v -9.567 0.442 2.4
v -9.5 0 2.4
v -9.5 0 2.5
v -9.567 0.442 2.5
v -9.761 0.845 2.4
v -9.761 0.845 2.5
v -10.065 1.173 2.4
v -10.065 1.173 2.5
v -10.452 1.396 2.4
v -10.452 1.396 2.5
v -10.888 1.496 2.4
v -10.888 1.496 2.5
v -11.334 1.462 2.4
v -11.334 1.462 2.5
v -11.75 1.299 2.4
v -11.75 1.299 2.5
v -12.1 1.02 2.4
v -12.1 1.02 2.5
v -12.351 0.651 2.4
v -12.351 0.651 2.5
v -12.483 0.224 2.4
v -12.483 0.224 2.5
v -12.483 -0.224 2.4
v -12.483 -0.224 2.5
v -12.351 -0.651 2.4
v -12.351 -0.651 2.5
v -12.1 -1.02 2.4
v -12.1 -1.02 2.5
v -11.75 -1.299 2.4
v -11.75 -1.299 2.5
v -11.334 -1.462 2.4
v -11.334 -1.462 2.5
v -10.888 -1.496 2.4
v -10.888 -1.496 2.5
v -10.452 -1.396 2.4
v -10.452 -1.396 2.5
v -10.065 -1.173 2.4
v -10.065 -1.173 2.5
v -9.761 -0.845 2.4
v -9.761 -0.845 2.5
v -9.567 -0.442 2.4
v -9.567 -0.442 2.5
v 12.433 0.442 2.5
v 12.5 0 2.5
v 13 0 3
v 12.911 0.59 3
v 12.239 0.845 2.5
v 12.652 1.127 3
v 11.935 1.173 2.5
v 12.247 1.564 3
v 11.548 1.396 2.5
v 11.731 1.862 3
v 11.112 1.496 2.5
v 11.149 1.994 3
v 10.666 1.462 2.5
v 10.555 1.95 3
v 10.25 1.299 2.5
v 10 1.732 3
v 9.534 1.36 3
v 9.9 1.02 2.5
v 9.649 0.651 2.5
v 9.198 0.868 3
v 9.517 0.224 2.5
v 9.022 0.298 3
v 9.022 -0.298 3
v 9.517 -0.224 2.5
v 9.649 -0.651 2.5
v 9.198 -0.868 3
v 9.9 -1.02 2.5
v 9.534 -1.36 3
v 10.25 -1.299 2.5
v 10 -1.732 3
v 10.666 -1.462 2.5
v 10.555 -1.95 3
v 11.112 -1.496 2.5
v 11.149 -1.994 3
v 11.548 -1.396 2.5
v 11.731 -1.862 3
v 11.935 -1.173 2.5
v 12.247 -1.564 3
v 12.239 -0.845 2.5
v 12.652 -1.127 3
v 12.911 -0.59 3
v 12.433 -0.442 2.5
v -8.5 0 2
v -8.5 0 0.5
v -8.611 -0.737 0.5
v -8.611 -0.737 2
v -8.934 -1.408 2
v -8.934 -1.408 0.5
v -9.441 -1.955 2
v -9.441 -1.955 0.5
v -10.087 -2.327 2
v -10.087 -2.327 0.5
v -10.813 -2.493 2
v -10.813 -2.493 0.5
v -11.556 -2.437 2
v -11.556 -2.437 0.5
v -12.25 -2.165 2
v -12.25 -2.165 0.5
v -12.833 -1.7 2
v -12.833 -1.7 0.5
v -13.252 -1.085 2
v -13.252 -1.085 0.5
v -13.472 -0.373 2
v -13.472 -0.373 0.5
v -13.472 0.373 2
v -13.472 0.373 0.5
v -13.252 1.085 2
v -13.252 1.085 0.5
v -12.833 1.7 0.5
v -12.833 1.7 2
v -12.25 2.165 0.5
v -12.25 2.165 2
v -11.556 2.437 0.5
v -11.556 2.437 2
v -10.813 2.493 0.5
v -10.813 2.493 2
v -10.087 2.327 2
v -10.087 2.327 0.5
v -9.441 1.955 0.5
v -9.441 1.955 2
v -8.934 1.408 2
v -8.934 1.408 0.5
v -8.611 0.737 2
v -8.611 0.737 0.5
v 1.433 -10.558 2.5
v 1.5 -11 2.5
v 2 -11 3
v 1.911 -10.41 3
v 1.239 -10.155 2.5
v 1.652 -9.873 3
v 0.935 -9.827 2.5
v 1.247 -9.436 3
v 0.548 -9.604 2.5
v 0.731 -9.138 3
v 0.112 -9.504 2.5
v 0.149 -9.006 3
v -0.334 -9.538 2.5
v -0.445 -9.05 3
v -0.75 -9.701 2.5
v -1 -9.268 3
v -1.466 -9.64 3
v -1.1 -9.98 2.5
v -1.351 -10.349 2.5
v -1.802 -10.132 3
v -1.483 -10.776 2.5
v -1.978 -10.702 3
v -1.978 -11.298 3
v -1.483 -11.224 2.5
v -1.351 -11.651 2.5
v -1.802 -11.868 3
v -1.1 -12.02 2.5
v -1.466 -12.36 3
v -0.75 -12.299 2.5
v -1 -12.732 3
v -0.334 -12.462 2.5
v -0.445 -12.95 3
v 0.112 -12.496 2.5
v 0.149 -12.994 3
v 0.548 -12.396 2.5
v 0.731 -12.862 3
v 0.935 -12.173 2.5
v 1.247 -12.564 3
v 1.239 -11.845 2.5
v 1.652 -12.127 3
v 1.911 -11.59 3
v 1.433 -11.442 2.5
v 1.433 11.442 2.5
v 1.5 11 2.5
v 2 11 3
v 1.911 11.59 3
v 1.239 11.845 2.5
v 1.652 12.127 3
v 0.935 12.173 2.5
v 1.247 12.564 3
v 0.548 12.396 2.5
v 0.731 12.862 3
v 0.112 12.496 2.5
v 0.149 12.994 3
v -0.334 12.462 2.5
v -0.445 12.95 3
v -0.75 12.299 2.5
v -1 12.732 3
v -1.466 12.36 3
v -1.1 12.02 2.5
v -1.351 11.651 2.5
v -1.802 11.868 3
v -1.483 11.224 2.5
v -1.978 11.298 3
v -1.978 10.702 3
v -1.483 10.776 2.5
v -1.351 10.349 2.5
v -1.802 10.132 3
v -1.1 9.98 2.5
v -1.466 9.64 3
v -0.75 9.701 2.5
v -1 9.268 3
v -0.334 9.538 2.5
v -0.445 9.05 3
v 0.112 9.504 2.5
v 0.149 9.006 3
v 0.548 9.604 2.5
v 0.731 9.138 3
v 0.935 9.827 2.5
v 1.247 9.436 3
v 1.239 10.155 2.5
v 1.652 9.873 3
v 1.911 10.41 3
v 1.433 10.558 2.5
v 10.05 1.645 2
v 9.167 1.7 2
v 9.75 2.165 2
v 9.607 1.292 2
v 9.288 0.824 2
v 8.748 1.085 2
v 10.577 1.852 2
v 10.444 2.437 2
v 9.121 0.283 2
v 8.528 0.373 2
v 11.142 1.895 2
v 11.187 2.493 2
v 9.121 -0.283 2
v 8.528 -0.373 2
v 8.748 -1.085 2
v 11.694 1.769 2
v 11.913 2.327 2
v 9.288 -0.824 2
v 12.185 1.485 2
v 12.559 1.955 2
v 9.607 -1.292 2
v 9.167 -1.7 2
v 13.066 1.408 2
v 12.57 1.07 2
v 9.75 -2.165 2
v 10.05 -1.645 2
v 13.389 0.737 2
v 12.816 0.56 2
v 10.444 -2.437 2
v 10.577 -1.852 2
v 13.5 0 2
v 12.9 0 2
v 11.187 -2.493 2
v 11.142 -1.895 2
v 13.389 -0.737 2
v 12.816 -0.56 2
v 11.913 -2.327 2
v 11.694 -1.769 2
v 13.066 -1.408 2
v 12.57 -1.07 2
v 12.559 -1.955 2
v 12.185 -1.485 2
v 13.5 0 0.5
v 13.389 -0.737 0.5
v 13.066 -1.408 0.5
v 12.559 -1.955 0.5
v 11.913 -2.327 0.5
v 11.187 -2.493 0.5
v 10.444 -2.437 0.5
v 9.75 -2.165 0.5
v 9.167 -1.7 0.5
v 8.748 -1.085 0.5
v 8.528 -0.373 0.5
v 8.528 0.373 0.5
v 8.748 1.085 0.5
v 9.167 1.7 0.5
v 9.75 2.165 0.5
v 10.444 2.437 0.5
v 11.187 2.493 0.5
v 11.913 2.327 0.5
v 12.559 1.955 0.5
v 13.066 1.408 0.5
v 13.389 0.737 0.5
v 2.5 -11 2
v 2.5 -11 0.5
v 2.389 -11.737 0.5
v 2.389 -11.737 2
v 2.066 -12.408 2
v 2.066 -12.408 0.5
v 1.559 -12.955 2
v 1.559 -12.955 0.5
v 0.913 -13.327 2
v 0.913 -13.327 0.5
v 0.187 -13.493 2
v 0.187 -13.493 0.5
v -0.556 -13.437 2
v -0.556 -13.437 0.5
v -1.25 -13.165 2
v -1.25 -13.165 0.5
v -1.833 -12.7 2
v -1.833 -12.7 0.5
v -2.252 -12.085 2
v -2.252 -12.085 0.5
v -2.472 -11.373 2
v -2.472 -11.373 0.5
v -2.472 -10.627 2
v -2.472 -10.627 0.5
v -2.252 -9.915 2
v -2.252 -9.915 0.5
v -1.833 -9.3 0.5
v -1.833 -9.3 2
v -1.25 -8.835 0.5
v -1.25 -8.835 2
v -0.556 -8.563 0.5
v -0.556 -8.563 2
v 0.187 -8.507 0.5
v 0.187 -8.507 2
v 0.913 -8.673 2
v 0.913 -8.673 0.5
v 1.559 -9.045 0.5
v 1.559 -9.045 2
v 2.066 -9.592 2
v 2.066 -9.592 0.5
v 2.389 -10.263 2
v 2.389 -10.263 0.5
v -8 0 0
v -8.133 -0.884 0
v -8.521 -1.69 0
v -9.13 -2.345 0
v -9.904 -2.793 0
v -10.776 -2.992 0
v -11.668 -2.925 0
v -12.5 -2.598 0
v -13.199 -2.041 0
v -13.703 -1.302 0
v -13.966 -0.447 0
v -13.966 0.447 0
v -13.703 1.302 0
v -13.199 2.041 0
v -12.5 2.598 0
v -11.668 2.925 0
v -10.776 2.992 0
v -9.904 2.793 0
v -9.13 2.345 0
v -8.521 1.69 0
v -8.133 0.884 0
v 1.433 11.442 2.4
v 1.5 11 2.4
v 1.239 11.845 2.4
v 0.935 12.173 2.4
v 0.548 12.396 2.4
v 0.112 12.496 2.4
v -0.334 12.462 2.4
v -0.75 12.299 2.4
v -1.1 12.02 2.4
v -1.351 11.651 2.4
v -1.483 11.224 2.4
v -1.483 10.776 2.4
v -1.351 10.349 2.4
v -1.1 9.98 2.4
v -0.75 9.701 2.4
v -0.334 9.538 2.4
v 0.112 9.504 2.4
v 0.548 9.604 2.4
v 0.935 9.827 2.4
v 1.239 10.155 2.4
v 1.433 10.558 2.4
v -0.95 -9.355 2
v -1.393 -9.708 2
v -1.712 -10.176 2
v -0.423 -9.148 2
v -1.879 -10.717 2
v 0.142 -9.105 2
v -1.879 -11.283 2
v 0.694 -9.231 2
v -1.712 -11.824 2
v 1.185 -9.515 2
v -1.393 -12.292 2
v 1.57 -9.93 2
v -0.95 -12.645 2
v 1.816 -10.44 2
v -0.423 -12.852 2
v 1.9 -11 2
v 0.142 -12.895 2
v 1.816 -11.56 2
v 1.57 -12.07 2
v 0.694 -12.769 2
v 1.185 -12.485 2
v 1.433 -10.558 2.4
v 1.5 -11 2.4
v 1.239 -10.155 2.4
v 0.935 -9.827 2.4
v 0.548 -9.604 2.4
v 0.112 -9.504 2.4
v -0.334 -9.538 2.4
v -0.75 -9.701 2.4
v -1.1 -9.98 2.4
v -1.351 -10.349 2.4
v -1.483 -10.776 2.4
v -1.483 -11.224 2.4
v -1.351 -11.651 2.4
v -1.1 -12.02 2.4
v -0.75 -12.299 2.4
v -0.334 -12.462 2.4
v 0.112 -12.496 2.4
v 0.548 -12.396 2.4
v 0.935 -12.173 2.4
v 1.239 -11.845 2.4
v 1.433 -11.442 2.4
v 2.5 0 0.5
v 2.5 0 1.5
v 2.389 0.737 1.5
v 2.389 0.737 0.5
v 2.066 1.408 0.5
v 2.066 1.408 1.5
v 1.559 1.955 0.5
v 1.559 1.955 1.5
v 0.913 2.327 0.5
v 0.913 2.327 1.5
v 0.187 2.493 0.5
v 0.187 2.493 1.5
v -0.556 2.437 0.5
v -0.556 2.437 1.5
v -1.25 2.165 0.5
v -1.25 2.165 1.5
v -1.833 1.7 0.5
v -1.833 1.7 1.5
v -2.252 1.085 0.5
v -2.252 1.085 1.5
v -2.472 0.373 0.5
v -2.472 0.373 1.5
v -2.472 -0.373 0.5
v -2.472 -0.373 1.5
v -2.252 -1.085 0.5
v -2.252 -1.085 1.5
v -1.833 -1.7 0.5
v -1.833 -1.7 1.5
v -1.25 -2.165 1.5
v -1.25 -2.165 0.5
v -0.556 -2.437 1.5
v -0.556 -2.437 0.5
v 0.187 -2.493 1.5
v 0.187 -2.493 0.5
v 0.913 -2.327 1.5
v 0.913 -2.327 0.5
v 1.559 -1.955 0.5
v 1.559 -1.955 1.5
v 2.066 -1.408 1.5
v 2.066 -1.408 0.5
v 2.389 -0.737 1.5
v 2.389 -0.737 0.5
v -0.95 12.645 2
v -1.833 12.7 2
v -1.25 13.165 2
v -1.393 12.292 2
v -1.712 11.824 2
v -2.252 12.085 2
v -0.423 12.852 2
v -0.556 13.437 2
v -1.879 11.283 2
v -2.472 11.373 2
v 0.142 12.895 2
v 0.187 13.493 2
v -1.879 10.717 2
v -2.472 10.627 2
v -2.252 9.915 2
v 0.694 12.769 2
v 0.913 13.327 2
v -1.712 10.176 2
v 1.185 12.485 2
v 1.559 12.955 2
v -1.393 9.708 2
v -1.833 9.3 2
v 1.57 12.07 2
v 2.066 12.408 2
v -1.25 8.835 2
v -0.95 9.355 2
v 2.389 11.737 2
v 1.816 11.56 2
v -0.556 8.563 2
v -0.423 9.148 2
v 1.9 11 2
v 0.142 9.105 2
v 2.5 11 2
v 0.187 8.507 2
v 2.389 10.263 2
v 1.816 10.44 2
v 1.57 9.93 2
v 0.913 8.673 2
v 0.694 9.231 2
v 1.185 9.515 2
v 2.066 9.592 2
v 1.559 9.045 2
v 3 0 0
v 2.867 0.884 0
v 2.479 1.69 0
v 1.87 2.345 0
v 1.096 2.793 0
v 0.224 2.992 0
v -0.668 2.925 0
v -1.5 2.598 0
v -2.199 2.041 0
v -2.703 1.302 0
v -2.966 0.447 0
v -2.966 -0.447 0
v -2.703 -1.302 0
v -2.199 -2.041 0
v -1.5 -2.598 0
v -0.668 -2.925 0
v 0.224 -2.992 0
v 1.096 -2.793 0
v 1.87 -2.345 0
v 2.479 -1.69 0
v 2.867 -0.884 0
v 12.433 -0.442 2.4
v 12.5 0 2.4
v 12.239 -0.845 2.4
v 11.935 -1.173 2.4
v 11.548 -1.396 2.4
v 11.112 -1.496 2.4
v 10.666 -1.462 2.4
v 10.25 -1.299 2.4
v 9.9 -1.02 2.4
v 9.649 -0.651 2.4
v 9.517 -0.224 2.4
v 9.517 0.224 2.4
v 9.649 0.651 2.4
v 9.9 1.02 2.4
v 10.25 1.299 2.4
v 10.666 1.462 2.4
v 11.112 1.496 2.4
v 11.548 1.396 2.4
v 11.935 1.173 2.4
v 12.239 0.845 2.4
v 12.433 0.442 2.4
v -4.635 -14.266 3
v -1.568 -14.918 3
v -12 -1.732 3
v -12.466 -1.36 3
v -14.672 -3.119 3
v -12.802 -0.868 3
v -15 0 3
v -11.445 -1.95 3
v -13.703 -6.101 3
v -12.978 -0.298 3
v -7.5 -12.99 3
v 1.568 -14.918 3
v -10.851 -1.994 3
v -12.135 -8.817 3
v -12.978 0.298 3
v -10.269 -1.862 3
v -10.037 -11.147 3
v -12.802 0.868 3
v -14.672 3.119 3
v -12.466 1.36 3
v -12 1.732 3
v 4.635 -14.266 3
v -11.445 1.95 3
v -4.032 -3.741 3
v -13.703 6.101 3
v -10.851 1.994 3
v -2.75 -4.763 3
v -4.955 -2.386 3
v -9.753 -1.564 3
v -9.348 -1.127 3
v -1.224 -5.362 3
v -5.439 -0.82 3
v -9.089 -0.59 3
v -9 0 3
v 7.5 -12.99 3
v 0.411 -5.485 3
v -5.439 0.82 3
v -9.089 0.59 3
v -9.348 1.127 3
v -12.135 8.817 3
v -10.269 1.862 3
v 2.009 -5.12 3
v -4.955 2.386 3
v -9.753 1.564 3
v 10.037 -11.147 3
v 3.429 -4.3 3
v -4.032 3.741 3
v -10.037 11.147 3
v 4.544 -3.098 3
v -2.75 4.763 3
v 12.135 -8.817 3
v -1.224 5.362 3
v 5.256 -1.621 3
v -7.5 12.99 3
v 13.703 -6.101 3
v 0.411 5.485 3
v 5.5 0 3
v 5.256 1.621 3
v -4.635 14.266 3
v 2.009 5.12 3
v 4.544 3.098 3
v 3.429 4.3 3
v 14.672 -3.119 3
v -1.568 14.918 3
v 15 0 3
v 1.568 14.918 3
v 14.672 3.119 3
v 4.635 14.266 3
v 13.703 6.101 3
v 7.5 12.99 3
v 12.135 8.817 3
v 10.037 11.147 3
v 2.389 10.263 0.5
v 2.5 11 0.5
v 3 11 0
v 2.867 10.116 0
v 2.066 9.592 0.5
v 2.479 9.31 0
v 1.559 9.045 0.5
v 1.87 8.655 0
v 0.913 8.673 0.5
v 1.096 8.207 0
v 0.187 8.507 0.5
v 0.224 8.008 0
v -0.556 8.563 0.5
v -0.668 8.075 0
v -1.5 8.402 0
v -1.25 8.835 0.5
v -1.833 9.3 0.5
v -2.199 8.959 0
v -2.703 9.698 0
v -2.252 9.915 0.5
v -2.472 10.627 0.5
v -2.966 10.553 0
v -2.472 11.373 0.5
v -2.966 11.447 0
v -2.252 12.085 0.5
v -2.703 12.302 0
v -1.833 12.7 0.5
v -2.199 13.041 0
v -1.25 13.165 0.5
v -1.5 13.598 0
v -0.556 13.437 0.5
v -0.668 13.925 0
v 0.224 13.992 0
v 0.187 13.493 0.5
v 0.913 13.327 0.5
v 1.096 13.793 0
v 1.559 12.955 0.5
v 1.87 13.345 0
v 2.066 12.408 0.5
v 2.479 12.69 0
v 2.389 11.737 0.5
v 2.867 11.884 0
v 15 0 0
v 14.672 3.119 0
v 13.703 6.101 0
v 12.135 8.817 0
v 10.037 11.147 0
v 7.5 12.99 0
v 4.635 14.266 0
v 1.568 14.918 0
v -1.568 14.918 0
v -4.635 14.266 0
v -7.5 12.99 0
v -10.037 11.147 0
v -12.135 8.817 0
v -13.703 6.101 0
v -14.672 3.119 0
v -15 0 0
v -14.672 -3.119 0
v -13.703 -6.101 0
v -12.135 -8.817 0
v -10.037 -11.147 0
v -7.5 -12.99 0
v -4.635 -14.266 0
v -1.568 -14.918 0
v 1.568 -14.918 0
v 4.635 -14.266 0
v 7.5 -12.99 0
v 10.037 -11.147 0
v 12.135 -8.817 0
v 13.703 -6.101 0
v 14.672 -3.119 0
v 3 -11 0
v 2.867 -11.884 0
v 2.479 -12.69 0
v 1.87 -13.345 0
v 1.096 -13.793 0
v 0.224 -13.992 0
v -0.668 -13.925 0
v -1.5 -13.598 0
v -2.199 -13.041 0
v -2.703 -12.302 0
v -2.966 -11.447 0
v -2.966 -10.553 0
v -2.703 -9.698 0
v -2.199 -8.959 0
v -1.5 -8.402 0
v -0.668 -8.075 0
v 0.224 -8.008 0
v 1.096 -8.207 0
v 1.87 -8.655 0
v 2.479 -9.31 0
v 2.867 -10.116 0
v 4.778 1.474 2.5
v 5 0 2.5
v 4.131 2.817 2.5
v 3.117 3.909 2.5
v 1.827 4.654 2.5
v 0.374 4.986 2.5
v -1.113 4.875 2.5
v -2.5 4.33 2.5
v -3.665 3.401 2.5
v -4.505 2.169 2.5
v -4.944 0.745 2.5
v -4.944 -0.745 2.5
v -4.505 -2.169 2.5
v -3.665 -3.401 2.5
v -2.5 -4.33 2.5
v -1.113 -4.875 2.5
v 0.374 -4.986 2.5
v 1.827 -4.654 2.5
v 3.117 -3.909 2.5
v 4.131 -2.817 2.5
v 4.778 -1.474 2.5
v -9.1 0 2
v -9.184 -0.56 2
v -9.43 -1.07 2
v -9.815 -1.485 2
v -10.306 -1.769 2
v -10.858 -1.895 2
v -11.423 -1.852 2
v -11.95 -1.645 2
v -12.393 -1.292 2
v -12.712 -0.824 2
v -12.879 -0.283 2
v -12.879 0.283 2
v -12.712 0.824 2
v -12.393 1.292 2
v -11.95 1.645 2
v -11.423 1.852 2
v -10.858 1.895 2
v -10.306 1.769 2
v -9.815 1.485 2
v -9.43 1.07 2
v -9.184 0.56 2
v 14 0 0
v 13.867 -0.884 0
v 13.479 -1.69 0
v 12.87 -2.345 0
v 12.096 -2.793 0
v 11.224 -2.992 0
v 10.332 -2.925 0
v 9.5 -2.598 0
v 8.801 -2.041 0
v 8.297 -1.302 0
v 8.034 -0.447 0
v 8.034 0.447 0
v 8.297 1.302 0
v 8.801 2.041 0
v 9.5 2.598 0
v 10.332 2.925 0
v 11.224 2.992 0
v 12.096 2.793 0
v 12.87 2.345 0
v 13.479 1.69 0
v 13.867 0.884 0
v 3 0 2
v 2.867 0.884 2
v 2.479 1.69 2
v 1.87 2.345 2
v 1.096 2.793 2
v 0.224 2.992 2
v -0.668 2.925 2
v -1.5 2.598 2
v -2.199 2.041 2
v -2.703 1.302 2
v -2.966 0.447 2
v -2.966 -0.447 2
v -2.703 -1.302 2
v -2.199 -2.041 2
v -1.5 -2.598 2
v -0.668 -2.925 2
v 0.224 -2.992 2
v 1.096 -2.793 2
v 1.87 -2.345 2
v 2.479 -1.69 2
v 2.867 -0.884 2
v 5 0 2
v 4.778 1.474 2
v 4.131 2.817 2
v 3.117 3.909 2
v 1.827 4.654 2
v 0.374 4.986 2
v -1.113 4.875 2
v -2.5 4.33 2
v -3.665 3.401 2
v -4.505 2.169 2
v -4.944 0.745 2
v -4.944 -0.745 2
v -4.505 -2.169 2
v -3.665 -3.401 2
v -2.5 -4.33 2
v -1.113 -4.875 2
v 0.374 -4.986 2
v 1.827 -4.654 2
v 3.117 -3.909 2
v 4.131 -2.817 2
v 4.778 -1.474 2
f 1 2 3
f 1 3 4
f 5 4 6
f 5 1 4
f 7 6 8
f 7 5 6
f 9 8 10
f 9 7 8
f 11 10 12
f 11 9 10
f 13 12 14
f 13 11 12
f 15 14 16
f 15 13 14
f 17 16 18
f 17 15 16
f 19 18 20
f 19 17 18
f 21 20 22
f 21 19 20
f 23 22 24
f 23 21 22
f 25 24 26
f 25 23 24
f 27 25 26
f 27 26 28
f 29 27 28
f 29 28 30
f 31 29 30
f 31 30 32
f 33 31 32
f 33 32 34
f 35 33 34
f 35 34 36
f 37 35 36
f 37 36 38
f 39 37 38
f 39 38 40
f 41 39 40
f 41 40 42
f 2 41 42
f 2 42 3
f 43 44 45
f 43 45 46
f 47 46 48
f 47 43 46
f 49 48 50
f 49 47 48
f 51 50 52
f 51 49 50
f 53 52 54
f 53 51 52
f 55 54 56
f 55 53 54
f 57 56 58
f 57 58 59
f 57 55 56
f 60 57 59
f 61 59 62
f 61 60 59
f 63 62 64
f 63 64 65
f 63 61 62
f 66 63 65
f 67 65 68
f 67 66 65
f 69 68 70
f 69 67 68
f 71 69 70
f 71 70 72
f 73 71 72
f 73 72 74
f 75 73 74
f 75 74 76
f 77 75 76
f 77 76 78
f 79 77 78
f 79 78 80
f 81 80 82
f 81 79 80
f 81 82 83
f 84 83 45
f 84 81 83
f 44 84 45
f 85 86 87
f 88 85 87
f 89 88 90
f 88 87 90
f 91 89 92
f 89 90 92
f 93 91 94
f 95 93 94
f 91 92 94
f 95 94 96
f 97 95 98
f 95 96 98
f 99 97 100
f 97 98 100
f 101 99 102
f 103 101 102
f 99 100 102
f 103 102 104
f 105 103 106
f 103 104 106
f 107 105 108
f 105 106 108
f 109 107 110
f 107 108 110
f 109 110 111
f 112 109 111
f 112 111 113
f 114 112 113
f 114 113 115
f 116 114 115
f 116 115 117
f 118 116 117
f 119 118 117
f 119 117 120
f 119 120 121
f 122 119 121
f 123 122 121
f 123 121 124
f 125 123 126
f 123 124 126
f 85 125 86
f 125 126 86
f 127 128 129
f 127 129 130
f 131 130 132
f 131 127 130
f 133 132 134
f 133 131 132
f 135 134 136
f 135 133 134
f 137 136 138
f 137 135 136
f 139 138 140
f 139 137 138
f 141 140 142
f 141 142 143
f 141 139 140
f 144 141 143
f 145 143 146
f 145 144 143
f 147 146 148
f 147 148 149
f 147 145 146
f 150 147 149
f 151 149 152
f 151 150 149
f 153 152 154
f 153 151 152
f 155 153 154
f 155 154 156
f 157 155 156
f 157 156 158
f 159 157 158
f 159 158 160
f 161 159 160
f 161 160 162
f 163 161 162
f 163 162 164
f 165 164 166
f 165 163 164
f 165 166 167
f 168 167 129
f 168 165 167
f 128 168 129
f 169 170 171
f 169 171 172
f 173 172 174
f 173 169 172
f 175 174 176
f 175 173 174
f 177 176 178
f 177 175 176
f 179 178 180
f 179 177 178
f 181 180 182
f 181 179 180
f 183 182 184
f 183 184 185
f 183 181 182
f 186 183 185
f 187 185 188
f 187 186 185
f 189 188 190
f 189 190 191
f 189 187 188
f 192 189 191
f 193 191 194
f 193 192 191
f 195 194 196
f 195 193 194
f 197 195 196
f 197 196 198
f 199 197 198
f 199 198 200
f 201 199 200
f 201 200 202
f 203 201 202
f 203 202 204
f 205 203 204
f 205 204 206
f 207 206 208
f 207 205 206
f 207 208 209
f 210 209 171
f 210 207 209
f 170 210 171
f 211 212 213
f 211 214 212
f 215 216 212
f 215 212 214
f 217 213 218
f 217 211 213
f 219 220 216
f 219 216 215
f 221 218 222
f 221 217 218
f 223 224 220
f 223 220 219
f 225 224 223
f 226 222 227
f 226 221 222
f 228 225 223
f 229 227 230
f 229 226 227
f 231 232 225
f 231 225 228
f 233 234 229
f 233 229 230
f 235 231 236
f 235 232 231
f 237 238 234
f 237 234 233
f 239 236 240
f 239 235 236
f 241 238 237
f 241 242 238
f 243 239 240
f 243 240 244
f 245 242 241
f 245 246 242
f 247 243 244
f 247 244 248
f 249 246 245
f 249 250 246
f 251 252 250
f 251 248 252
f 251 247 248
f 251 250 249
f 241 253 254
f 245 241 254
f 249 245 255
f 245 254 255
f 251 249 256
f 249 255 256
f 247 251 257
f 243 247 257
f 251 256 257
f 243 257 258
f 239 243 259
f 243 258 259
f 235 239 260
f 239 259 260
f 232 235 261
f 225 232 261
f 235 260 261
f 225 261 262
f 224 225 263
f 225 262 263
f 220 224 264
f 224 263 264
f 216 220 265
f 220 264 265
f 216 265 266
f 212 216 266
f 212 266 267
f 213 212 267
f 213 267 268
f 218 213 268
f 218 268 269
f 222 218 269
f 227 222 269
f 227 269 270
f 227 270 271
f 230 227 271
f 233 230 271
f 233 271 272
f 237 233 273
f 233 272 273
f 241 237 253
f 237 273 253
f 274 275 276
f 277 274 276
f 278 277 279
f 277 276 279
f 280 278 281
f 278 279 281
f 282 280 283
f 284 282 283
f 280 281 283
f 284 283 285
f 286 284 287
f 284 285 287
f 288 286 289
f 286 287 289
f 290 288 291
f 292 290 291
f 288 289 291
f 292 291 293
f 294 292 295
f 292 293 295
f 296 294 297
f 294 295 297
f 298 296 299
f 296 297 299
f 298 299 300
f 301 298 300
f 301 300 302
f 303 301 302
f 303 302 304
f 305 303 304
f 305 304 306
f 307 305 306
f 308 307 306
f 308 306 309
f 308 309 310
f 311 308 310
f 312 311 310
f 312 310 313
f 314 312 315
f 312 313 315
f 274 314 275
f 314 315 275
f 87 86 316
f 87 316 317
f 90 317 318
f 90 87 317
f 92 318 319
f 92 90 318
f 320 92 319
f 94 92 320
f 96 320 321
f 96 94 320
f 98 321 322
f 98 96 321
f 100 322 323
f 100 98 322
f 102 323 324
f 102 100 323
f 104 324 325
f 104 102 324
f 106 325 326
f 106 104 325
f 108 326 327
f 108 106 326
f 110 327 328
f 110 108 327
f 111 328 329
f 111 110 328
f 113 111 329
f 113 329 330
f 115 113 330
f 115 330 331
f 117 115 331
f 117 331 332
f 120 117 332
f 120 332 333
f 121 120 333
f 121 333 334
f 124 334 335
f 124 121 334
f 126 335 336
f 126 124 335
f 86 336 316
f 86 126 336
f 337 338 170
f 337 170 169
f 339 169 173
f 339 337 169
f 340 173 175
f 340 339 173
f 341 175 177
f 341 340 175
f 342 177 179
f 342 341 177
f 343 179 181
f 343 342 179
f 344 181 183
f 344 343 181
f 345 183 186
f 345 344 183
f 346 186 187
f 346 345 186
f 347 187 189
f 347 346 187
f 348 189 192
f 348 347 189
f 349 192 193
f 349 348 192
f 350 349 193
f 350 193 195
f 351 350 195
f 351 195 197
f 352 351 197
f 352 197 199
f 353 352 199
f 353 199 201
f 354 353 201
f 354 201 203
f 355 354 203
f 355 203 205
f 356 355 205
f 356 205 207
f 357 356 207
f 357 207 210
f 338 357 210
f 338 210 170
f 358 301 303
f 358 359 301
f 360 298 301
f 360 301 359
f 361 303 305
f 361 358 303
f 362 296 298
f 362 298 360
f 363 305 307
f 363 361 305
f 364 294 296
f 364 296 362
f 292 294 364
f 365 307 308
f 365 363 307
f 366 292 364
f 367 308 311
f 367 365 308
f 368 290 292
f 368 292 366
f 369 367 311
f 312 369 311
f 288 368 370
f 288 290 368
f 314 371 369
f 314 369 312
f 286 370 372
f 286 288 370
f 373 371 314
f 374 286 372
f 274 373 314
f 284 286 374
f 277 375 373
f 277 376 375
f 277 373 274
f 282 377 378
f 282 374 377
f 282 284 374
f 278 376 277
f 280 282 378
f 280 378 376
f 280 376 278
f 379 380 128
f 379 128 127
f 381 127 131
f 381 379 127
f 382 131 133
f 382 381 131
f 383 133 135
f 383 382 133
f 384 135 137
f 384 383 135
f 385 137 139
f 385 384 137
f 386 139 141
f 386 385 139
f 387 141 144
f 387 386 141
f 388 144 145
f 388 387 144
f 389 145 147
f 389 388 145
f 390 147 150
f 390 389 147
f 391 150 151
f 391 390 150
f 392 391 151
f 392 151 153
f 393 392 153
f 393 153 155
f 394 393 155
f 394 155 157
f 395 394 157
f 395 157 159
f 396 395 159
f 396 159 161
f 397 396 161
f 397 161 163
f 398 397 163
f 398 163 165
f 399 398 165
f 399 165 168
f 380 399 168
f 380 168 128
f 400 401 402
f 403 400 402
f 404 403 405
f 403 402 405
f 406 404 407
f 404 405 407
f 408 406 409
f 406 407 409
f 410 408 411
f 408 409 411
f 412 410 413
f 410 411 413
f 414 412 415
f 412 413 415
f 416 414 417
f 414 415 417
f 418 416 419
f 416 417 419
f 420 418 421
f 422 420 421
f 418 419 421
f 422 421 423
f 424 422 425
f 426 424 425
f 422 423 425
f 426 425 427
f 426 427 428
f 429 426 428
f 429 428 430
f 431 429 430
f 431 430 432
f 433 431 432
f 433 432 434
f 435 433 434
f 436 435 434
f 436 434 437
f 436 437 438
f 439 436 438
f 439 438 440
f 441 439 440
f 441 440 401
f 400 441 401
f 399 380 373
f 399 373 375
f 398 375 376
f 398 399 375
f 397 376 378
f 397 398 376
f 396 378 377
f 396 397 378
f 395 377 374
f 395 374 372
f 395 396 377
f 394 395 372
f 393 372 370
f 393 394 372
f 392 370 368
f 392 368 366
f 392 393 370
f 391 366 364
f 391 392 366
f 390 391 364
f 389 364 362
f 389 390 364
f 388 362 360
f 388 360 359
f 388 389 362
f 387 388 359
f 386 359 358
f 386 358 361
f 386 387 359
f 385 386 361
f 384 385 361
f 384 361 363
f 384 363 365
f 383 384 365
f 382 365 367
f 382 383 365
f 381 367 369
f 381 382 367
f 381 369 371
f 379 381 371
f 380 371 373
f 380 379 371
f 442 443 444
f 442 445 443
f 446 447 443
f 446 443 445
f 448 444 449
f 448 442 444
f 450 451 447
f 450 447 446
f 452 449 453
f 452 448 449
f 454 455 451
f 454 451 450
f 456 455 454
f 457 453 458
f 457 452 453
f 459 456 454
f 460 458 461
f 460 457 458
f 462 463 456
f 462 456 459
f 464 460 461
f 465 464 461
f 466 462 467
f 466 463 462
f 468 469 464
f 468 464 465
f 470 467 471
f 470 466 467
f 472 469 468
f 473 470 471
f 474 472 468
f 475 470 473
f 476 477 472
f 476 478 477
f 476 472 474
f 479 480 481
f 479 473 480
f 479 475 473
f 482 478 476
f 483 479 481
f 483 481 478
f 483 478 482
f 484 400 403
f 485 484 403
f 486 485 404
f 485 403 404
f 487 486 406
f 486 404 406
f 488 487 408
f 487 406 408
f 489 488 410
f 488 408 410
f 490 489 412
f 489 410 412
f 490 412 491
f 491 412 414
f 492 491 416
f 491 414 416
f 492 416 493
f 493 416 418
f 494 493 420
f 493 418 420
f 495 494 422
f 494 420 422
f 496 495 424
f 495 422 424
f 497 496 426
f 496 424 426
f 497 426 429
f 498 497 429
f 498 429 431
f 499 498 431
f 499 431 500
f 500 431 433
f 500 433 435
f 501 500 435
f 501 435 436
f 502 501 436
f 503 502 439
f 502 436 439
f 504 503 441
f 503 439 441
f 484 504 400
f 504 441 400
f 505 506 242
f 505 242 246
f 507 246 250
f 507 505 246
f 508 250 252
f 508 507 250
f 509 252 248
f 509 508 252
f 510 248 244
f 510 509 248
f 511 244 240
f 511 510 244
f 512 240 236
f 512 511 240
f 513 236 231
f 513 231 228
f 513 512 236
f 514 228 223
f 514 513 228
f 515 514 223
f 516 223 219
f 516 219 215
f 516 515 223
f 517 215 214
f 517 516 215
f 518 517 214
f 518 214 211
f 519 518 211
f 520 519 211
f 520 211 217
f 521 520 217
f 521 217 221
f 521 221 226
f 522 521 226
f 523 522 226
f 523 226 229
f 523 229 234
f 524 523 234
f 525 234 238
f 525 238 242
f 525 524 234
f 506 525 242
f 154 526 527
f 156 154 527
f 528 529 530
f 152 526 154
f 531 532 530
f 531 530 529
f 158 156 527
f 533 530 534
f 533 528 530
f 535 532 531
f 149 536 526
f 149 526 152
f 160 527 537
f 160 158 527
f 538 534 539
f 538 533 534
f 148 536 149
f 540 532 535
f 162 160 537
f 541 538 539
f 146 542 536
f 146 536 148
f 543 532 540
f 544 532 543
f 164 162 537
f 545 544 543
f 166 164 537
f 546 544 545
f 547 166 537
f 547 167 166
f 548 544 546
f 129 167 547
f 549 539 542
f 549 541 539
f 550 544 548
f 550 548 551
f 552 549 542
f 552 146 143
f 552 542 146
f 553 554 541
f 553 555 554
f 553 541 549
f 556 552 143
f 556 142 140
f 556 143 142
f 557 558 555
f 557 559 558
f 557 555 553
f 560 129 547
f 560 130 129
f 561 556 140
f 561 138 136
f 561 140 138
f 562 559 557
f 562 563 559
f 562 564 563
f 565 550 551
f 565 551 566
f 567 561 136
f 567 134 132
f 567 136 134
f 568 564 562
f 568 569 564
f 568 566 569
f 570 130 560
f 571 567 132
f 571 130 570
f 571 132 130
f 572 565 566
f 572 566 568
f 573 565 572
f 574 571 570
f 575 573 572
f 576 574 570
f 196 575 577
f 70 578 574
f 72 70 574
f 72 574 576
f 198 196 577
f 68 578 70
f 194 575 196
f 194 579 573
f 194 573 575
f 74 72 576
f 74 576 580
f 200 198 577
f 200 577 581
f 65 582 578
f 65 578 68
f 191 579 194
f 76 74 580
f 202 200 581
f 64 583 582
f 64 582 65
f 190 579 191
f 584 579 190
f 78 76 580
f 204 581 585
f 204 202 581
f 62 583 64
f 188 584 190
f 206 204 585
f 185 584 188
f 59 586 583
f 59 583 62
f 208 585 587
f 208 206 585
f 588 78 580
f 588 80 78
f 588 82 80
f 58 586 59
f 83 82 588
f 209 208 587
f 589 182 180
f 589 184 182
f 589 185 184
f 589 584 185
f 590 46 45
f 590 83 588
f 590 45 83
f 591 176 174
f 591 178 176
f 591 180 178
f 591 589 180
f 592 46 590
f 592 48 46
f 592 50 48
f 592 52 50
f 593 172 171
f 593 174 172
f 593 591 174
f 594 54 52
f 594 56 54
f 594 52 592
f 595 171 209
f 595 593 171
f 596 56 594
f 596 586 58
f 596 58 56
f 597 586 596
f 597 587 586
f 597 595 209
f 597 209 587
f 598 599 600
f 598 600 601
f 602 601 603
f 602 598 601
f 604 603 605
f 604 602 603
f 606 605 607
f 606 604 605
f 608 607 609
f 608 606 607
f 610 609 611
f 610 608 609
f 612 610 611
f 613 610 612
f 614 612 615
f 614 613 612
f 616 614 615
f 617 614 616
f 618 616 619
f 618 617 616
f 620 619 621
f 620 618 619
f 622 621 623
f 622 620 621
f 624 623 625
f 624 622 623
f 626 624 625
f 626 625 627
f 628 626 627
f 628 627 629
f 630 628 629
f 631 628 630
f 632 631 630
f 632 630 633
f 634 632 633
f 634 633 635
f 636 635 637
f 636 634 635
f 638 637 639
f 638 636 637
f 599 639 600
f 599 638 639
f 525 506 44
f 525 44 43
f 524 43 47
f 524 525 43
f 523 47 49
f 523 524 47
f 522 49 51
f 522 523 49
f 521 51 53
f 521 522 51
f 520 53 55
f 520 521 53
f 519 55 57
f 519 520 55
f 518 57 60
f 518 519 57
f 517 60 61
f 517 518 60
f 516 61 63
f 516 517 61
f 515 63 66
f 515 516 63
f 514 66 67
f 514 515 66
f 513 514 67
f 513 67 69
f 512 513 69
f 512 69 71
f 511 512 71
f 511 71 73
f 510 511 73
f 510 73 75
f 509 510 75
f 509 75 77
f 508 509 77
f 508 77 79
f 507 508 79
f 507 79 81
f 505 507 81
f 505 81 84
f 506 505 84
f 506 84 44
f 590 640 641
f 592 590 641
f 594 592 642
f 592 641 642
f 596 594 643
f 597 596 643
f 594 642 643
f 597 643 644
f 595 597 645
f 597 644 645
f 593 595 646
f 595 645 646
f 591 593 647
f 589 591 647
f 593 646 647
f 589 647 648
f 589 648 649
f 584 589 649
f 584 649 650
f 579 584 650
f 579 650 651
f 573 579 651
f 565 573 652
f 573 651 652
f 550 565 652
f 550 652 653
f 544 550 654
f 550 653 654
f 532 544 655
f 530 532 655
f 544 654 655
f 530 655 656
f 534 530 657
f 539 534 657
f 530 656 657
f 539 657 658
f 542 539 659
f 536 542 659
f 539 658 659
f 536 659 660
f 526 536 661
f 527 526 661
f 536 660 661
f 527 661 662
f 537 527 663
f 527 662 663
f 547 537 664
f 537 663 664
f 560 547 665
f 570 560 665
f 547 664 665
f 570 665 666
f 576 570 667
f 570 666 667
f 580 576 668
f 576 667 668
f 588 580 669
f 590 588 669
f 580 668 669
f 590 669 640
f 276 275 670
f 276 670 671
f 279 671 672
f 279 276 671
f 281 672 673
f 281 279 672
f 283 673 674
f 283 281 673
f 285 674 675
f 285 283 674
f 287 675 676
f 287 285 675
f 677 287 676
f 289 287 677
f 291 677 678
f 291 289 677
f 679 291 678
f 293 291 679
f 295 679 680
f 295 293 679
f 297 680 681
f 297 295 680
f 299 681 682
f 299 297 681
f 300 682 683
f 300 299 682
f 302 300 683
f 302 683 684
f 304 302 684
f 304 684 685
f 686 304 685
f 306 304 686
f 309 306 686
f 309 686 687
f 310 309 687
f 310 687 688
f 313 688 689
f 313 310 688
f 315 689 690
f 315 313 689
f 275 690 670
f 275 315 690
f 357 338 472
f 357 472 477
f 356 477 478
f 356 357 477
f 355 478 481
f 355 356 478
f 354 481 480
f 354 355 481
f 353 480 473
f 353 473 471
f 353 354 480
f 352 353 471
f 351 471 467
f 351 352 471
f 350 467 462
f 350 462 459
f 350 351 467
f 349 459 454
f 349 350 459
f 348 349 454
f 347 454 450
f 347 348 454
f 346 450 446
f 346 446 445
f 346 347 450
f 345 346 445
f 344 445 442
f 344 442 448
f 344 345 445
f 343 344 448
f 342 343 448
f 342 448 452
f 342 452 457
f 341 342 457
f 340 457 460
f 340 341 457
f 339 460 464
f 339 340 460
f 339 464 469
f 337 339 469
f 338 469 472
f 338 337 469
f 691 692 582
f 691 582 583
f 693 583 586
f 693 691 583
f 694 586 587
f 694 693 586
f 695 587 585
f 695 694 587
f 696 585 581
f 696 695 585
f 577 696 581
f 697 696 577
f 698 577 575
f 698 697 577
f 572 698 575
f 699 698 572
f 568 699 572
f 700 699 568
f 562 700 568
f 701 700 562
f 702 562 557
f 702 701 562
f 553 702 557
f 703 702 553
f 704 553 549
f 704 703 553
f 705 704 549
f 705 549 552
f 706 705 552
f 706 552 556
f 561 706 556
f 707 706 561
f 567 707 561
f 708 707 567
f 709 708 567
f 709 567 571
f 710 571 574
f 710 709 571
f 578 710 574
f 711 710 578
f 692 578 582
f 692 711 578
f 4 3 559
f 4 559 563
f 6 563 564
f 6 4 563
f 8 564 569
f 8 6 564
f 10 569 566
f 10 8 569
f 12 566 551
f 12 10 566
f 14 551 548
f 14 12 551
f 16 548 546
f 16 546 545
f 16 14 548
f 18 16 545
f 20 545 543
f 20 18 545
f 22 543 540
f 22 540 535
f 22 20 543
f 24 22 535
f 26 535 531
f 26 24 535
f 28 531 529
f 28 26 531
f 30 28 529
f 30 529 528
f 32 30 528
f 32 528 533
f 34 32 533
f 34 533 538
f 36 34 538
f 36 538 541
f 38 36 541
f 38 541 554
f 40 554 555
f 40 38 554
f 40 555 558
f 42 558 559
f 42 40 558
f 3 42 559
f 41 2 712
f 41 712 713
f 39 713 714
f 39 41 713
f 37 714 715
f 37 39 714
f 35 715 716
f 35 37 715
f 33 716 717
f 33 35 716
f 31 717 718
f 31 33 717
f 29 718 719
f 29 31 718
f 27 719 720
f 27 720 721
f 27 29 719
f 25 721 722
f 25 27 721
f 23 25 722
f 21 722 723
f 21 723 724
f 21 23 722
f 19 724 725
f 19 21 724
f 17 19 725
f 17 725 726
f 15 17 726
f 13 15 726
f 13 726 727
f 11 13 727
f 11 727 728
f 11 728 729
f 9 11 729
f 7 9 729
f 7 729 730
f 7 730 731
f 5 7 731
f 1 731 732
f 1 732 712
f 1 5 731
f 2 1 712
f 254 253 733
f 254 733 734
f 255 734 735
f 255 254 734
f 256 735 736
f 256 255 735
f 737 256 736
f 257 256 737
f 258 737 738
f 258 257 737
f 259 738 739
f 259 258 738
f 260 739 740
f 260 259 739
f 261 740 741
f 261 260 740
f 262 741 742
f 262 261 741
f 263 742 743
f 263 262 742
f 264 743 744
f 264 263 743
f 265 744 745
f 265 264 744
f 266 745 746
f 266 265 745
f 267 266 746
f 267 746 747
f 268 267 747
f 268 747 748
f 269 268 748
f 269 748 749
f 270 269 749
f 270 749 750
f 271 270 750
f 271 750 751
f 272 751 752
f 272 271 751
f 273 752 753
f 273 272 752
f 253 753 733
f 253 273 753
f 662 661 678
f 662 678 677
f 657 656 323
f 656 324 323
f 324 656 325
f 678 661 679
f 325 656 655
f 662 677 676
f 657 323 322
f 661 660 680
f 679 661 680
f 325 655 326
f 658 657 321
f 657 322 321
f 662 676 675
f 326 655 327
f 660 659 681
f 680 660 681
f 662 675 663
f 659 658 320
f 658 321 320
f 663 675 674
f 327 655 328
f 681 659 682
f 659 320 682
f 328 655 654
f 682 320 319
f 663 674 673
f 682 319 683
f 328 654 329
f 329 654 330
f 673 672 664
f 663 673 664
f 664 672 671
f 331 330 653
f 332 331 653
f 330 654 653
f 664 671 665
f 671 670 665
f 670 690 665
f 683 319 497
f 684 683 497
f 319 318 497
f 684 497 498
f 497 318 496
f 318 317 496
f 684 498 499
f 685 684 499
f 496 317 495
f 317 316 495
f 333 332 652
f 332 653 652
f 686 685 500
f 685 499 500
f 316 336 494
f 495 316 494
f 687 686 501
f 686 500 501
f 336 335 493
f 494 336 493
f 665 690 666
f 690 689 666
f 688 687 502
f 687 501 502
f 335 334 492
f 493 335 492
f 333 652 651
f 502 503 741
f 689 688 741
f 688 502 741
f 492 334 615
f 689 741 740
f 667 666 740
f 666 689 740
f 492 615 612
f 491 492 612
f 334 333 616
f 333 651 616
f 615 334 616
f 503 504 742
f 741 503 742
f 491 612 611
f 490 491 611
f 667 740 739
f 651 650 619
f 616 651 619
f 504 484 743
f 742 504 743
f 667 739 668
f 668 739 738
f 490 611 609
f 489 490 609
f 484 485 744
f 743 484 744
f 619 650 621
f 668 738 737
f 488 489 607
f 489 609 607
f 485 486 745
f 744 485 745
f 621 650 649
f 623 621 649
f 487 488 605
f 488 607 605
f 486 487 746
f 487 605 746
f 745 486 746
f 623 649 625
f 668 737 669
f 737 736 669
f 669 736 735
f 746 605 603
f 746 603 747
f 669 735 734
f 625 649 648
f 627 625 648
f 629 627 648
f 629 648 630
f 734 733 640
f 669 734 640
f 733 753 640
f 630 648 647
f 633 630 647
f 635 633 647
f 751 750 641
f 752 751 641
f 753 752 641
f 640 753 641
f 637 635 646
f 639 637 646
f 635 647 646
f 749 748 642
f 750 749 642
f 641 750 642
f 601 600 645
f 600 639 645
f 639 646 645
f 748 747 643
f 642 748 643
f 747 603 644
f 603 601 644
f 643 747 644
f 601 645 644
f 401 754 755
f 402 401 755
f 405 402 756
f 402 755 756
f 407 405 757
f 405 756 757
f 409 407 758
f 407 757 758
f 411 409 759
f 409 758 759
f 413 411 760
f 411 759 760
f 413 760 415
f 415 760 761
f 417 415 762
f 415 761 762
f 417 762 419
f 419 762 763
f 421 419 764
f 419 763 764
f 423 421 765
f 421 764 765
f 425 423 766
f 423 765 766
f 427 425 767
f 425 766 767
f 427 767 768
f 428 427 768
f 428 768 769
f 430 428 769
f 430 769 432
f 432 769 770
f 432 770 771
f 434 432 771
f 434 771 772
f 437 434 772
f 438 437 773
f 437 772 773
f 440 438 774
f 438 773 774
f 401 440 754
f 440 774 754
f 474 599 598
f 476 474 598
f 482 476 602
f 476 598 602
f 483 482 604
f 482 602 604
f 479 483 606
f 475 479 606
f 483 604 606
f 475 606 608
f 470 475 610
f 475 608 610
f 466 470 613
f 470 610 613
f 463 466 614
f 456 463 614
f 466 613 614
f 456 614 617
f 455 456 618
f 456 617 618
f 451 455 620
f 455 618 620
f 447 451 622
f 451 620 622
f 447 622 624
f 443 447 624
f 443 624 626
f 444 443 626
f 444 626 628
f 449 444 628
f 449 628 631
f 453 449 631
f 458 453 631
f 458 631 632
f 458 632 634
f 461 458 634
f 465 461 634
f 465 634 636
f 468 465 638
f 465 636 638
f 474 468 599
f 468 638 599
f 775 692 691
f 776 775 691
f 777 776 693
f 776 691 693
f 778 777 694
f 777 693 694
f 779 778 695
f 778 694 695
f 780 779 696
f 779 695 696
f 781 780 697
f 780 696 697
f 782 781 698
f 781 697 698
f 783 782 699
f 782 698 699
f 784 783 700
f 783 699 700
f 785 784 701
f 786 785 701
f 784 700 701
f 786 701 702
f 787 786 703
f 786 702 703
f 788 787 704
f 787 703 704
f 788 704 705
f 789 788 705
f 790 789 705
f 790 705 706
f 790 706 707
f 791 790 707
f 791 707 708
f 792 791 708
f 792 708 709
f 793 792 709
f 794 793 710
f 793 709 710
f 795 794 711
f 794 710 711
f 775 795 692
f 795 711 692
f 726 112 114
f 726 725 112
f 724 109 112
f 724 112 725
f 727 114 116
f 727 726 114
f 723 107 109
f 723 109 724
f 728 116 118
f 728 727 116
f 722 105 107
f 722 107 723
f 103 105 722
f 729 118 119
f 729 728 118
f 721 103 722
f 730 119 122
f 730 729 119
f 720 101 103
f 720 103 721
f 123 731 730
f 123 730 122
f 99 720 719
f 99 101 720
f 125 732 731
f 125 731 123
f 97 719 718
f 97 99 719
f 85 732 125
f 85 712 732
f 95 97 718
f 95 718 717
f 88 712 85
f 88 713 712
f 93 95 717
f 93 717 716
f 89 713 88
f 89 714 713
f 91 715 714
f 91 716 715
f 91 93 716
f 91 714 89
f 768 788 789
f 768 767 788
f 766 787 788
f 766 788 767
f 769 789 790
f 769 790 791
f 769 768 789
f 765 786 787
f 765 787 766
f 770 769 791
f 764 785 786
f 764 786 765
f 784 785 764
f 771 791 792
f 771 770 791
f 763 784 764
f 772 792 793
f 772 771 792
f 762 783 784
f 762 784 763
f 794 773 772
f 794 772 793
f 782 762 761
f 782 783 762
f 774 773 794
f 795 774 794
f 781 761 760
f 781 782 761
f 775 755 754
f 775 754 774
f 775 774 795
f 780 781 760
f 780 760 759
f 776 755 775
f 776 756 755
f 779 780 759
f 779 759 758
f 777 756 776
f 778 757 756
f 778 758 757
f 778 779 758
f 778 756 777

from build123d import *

# Parameters (mm, degrees)
SKETCH_R        = 15
SKETCH_R_2      = 1.5
PAD_DEPTH       = 3
SKETCH002_R     = 2.5
POCKET_DEPTH    = 9
SKETCH001_R     = 5
POCKET001_DEPTH = 1
SKETCH003_R     = 2.5
POCKET002_DEPTH = 2
CHAMFER_SIZE    = 0.5
CHAMFER001_SIZE = 0.4


with BuildPart() as part:
    # Sketch → Pad (new body)
    with BuildSketch(Plane.XY):
        Circle(SKETCH_R)
        with Locations((0, 11)):
            Circle(SKETCH_R_2, mode=Mode.SUBTRACT)
        with Locations((-11, 0)):
            Circle(SKETCH_R_2, mode=Mode.SUBTRACT)
        with Locations((0, -11)):
            Circle(SKETCH_R_2, mode=Mode.SUBTRACT)
        with Locations((11, 0)):
            Circle(SKETCH_R_2, mode=Mode.SUBTRACT)
    extrude(amount=PAD_DEPTH)

    # Sketch002 (on Face7 of Pad) → Pocket (cut)
    with BuildSketch(Plane.XY.offset(3)):
        Circle(SKETCH002_R)
    extrude(amount=-POCKET_DEPTH, mode=Mode.SUBTRACT)

    # Sketch001 (on Face7 of Pad) → Pocket001 (cut)
    with BuildSketch(Plane.XY.offset(3)):
        Circle(SKETCH001_R)
    extrude(amount=-POCKET001_DEPTH, mode=Mode.SUBTRACT)

    # Sketch003 (on Face2 of Pocket001) → Pocket002 (cut)
    with BuildSketch(Plane(origin=(0, 0, 0), x_dir=(1, 0, 0), z_dir=(0, 0, -1))):
        with Locations((0, 11)):
            Circle(SKETCH003_R)
        with Locations((11, 0)):
            Circle(SKETCH003_R)
        with Locations((0, -11)):
            Circle(SKETCH003_R)
        with Locations((-11, 0)):
            Circle(SKETCH003_R)
    extrude(amount=-POCKET002_DEPTH, mode=Mode.SUBTRACT)

    # Chamfer
    chamfer_edges = [part.edges().sort_by_distance(p)[0] for p in [
        (-1.5, 11, 3),
        (9.5, 0, 3),
        (-1.5, -11, 3),
        (-12.5, 0, 3),
        (-5, 0, 3),
        (-2.5, 0, 2),
        (-2.5, -11, 0),
        (8.5, 0, 0),
        (-2.5, 11, 0),
        (-13.5, 0, 0),
        (-2.5, 0, 0),
    ]]
    chamfer(chamfer_edges, length=CHAMFER_SIZE)

    # Chamfer001
    chamfer001_edges = [part.edges().sort_by_distance(p)[0] for p in [
        (-1.5, -11, 2),
        (9.5, 0, 2),
        (-1.5, 11, 2),
        (-12.5, 0, 2),
    ]]
    chamfer(chamfer001_edges, length=CHAMFER001_SIZE)


solid = part.part
